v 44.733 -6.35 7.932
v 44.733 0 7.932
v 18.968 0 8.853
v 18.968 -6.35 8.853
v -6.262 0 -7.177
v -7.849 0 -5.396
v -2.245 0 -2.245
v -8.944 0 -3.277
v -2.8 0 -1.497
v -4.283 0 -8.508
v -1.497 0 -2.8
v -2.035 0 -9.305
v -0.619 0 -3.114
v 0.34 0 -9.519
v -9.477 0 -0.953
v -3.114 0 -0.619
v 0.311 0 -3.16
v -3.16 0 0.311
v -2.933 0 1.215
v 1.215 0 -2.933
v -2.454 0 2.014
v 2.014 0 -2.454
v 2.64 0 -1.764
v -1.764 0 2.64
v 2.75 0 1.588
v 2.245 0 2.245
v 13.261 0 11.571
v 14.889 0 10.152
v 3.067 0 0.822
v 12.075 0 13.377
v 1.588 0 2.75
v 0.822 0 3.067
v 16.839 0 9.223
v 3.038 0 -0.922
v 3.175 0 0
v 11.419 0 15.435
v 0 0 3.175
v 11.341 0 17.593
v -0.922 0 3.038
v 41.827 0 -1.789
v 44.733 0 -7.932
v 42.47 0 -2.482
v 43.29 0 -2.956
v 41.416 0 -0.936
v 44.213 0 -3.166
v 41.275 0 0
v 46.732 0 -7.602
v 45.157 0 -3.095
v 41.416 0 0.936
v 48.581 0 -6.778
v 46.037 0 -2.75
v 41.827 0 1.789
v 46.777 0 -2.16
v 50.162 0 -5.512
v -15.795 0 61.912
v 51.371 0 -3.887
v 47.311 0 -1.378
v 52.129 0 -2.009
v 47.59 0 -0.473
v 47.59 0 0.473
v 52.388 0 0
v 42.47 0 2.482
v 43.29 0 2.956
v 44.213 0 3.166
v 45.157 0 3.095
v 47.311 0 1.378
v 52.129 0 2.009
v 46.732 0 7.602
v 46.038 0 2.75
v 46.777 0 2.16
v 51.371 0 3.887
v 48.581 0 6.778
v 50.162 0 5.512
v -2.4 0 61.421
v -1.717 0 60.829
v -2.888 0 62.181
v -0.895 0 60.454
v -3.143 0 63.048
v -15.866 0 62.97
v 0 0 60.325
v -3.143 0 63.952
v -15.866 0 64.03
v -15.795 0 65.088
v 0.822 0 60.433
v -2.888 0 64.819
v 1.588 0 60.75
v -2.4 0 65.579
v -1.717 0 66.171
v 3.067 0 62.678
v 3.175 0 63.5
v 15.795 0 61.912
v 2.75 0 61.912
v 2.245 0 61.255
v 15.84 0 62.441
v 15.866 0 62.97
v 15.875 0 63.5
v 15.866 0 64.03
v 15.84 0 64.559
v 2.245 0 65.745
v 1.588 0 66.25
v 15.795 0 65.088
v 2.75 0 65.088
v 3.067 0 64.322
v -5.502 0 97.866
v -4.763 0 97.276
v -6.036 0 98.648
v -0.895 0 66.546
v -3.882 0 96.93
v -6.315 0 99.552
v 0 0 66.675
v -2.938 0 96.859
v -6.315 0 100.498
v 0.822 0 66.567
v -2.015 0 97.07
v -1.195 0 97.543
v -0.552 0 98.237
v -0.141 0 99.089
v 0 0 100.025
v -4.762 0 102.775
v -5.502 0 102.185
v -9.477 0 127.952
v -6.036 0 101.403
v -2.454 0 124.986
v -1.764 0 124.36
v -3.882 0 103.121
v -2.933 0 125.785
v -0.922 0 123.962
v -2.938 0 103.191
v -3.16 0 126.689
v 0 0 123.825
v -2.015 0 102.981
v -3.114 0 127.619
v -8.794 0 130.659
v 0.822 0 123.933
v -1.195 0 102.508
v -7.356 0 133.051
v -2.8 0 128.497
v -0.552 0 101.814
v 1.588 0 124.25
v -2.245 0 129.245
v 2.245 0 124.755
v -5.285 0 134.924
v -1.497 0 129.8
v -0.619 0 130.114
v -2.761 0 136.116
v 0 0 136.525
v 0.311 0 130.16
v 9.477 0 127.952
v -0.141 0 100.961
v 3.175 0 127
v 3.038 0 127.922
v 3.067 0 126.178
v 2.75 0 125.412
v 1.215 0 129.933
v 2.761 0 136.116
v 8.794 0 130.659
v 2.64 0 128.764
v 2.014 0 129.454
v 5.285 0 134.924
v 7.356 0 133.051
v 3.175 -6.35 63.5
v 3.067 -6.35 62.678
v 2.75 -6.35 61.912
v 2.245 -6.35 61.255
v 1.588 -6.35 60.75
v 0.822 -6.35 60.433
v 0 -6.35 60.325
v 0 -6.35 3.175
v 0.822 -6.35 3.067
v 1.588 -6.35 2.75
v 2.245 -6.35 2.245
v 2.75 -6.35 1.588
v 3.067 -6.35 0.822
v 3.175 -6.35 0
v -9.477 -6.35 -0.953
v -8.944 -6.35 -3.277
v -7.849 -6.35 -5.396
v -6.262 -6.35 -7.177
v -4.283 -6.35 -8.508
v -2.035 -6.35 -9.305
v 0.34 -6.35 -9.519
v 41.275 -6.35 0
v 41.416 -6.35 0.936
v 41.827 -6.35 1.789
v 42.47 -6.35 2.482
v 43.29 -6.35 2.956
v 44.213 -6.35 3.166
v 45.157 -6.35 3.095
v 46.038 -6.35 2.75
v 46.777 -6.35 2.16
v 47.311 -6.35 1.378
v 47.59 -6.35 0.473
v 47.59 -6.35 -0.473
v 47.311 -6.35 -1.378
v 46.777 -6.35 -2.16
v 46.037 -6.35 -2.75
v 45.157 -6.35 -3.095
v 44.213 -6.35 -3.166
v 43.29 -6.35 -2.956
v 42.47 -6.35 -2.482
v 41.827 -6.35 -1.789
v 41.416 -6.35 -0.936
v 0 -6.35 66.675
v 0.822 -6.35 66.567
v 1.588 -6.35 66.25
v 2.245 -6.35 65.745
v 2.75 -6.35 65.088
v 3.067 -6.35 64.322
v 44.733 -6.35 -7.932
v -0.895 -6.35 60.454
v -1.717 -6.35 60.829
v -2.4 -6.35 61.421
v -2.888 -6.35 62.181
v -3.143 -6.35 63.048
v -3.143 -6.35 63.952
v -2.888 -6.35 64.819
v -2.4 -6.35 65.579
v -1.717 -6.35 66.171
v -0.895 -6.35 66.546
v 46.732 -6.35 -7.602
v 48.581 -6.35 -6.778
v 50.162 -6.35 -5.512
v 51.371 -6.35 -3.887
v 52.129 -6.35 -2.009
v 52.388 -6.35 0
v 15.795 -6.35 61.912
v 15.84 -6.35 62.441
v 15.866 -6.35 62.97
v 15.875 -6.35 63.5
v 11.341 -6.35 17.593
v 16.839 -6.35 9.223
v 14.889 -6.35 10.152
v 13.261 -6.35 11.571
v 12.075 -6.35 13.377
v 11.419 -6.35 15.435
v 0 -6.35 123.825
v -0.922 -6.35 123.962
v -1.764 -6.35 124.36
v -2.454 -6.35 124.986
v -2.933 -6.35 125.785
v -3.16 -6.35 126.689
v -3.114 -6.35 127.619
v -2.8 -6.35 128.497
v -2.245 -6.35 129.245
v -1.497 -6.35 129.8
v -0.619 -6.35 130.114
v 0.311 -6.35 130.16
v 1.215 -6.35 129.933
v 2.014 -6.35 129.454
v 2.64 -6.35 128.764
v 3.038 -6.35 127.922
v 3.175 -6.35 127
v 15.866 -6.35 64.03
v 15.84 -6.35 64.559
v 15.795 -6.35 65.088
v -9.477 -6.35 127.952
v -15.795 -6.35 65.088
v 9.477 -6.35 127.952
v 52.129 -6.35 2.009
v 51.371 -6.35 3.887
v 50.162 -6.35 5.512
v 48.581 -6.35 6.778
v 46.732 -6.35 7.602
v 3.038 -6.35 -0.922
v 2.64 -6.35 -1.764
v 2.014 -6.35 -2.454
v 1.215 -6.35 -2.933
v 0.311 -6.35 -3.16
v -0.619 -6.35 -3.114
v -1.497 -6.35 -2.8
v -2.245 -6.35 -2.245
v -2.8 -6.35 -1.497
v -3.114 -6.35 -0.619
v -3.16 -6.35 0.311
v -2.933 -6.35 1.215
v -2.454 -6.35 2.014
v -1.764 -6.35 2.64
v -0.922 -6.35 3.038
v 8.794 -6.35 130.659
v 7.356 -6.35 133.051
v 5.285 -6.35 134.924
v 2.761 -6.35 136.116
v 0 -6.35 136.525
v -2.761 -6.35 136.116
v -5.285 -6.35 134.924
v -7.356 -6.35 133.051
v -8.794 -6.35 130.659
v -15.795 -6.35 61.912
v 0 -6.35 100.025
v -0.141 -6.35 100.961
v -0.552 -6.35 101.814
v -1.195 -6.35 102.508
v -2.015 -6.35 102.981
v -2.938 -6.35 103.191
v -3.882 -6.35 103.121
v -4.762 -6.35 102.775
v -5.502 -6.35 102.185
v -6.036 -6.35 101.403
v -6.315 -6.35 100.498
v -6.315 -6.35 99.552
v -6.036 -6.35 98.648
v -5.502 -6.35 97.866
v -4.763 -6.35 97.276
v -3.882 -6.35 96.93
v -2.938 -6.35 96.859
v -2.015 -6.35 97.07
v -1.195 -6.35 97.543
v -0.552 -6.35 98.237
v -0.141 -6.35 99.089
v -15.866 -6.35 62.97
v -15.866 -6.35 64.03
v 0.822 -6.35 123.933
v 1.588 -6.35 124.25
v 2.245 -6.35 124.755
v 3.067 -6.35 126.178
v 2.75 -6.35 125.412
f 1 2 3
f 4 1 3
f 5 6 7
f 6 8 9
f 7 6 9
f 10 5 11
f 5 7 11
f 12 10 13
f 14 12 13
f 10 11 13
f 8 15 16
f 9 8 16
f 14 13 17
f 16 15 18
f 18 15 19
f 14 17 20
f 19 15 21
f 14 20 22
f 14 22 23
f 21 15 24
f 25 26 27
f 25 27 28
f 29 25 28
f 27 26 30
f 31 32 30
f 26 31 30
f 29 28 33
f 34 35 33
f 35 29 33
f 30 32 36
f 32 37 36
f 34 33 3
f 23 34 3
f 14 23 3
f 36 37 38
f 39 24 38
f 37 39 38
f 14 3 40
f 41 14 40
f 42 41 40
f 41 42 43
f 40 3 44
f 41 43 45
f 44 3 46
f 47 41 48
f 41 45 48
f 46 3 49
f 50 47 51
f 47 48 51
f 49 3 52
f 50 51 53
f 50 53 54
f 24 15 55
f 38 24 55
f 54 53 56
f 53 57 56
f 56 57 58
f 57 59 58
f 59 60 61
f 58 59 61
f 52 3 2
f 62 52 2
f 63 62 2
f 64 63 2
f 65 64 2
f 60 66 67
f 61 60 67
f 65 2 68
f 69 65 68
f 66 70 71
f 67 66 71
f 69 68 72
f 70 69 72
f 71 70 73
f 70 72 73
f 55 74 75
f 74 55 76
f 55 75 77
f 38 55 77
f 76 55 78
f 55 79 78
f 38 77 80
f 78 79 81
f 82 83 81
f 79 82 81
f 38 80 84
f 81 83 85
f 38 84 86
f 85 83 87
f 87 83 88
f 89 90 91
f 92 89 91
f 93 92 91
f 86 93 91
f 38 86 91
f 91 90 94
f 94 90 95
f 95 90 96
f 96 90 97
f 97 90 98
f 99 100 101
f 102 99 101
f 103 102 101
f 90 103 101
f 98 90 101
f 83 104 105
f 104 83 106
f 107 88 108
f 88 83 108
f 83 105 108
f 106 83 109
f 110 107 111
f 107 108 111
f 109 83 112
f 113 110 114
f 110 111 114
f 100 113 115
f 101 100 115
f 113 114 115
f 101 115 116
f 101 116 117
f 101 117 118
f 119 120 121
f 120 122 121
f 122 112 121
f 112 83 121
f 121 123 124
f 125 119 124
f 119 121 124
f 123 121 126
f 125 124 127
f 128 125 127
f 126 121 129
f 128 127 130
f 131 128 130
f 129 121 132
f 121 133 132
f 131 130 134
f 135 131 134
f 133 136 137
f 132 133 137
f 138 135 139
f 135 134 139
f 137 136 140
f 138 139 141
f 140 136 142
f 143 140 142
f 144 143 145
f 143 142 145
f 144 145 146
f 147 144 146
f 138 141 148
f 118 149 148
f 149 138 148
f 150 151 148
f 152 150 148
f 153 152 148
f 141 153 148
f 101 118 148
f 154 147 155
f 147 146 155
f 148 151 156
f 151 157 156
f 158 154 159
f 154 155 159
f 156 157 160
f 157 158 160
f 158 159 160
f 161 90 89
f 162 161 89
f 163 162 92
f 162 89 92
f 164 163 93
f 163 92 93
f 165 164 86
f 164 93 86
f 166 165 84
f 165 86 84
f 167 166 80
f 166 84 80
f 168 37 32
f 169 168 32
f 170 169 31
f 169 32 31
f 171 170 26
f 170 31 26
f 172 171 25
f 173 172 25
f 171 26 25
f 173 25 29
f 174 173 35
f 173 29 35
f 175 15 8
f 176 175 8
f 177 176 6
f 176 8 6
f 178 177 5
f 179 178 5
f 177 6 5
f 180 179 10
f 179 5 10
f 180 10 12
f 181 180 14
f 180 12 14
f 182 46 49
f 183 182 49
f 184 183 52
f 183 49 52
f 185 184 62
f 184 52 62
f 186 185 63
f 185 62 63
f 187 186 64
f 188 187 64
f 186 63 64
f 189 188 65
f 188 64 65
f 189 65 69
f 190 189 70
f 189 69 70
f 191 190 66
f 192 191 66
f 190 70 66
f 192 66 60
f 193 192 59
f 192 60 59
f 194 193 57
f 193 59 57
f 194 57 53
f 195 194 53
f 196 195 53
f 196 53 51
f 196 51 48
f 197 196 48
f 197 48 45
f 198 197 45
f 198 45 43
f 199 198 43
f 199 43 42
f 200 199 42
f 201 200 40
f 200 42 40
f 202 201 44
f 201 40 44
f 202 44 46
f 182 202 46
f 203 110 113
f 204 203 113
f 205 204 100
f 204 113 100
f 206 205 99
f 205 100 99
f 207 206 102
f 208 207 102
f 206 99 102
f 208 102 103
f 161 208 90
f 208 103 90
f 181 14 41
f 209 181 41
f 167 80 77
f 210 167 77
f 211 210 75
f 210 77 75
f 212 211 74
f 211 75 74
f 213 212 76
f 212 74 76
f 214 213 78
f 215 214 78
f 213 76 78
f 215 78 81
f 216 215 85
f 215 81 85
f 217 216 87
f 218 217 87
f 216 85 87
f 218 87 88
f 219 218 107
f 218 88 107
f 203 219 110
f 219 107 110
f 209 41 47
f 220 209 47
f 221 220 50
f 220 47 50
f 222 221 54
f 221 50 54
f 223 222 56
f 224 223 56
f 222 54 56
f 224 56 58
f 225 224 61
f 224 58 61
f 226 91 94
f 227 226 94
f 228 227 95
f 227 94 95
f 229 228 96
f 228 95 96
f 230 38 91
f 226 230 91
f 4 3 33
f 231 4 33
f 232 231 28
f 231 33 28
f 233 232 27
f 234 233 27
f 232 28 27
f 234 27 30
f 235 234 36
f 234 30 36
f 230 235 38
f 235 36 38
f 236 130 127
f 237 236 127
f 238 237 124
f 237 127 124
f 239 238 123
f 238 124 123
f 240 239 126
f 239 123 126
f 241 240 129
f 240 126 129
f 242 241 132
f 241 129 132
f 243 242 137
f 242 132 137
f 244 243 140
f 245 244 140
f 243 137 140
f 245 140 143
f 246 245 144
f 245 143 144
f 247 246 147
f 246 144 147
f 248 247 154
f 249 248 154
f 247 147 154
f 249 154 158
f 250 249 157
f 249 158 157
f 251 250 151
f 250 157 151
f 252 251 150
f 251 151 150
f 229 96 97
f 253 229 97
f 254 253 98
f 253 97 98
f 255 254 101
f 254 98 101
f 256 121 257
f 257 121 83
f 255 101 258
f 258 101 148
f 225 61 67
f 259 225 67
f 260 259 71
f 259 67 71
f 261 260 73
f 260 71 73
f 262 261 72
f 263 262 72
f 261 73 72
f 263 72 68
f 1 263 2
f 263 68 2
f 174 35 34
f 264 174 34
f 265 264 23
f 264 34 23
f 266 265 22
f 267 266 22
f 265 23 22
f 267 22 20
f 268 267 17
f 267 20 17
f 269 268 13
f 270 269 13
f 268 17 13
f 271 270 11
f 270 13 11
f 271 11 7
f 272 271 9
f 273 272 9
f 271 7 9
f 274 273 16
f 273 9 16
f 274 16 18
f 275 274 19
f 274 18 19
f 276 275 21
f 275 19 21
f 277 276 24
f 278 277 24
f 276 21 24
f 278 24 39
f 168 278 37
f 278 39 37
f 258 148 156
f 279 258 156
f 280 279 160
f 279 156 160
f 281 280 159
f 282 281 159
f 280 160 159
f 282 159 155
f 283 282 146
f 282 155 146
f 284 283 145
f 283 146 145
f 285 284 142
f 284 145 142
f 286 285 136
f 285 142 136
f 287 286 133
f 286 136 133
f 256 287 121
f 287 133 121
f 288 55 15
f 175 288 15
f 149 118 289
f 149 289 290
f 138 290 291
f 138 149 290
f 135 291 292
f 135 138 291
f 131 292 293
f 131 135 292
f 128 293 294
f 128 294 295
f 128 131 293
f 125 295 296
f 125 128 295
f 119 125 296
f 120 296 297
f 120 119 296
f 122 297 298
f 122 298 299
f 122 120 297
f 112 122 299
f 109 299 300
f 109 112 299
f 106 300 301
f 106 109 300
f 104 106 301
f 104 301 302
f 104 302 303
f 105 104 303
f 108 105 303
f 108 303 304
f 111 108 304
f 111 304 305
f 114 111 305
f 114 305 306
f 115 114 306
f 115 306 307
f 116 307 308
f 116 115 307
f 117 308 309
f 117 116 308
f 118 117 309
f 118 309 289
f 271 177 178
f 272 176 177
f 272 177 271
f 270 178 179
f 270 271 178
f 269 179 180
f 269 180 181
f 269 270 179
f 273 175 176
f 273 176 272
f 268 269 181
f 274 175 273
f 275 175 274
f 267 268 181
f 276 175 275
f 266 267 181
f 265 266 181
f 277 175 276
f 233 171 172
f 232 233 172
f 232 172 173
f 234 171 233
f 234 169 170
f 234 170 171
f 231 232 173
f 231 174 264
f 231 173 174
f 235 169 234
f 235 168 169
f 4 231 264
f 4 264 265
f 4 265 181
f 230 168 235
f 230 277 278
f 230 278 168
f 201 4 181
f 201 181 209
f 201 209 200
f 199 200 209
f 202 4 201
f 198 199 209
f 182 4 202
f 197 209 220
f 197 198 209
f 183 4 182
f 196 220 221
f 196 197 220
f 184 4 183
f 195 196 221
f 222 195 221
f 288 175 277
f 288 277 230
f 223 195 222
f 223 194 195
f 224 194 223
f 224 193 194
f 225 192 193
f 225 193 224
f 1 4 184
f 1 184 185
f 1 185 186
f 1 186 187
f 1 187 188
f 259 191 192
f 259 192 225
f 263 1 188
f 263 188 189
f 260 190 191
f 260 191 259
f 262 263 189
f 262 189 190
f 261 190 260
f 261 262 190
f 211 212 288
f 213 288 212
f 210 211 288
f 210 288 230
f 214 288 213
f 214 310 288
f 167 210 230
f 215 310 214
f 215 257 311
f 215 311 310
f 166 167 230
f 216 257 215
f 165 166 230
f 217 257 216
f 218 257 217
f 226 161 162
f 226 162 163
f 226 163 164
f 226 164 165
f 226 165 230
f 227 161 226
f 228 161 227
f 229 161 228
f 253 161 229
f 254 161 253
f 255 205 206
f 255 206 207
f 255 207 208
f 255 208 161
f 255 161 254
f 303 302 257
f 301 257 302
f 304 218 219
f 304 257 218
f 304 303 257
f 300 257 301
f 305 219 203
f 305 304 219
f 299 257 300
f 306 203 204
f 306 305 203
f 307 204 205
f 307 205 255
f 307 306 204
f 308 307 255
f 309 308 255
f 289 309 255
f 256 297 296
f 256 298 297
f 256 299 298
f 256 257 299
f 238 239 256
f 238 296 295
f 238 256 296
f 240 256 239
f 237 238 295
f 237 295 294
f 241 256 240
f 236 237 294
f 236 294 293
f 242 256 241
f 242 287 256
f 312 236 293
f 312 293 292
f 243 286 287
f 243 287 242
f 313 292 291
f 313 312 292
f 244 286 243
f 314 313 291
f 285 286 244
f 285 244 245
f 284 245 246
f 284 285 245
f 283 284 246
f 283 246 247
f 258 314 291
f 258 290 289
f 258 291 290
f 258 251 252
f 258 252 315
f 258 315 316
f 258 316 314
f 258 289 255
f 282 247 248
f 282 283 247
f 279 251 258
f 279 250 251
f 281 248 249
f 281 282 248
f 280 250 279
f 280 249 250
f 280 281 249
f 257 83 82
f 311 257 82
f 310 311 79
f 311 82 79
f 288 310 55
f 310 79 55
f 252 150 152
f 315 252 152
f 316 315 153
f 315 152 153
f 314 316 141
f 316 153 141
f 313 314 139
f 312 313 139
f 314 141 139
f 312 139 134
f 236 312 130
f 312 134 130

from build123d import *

# Parameters (mm, degrees)
F0_R     = 3.175
F1_DEPTH = 6.35


with BuildPart() as f1:
    # F0 (on Front) → F1 (new body)
    with BuildSketch(Plane.XZ):
        with BuildLine():
            ThreePointArc((9.4772553384, 127.9525), (0, 136.525), (-9.4772553384, 127.9525))
            ThreePointArc((-9.4772553384, 127.9525), (-7.063929059, 120.6104357543), (0, 117.475))
            ThreePointArc((0, 117.475), (6.7351920908, 120.2648079092), (9.525, 127))
            ThreePointArc((9.525, 127), (9.5130563464, 127.4768479324), (9.4772553384, 127.9525))
        make_face()
        with BuildLine():
            ThreePointArc((3.175, 127), (2.2450640303, 124.7549359697), (0, 123.825))
            ThreePointArc((0, 123.825), (-2.2450640303, 129.2450640303), (3.175, 127))
        make_face(mode=Mode.SUBTRACT)
        with BuildLine():
            Line((-9.4772553384, 127.9525), (-15.7954255641, 65.0875))
            ThreePointArc((-15.7954255641, 65.0875), (-10.6492737428, 75.2732150983), (0, 79.375))
            Line((0, 79.375), (0, 100.0252))
            Line((0, 100.0252), (0, 117.475))
            ThreePointArc((0, 117.475), (-7.063929059, 120.6104357543), (-9.4772553384, 127.9525))
        make_face()
        with Locations((-3.175, 100.0252)):
            Circle(F0_R, mode=Mode.SUBTRACT)
        with BuildLine():
            Line((0, 100.0252), (0, 79.375))
            ThreePointArc((0, 79.375), (10.6492737428, 75.2732150983), (15.7954255641, 65.0875))
            Line((15.7954255641, 65.0875), (9.4772553384, 127.9525))
            ThreePointArc((9.4772553384, 127.9525), (9.5130563464, 127.4768479324), (9.525, 127))
            ThreePointArc((9.525, 127), (6.7351920908, 120.2648079092), (0, 117.475))
            Line((0, 117.475), (0, 100.0252))
        make_face()
        with BuildLine():
            ThreePointArc((-15.7954255641, 61.9125), (-10.6492737428, 51.7267849017), (0, 47.625))
            Line((0, 47.625), (0, 60.325))
            ThreePointArc((0, 60.325), (-3.175, 63.5), (0, 66.675))
            Line((0, 66.675), (0, 79.375))
            ThreePointArc((0, 79.375), (-10.6492737428, 75.2732150983), (-15.7954255641, 65.0875))
            ThreePointArc((-15.7954255641, 65.0875), (-15.875, 63.5), (-15.7954255641, 61.9125))
        make_face()
        with BuildLine():
            Line((0, 60.325), (0, 47.625))
            ThreePointArc((0, 47.625), (10.6492737428, 51.7267849017), (15.7954255641, 61.9125))
            ThreePointArc((15.7954255641, 61.9125), (15.8550939106, 62.7052534459), (15.875, 63.5))
            ThreePointArc((15.875, 63.5), (15.8550939106, 64.2947465541), (15.7954255641, 65.0875))
            ThreePointArc((15.7954255641, 65.0875), (10.6492737428, 75.2732150983), (0, 79.375))
            Line((0, 79.375), (0, 66.675))
            ThreePointArc((0, 66.675), (2.2450640303, 65.7450640303), (3.175, 63.5))
            ThreePointArc((3.175, 63.5), (2.2450640303, 61.2549359697), (0, 60.325))
        make_face()
        with BuildLine():
            ThreePointArc((-9.4772553384, -0.9525), (-7.063929059, 6.3895642457), (0, 9.525))
            Line((0, 9.525), (0, 47.625))
            ThreePointArc((0, 47.625), (-10.6492737428, 51.7267849017), (-15.7954255641, 61.9125))
            Line((-15.7954255641, 61.9125), (-9.4772553384, -0.9525))
        make_face()
        with BuildLine():
            Line((0, 47.625), (0, 9.525))
            ThreePointArc((0, 9.525), (6.7351920908, 6.7351920908), (9.525, 0))
            Line((9.525, 0), (36.5125, 0))
            ThreePointArc((36.5125, 0), (38.9384772185, 5.7120069047), (44.7334821429, 7.9324362036))
            Line((44.7334821429, 7.9324362036), (18.9676000005, 8.8532337108))
            ThreePointArc((18.9676000005, 8.8532337108), (13.2611998974, 11.5713591498), (11.3411865923, 17.5933818124))
            Line((11.3411865923, 17.5933818124), (15.7954255641, 61.9125))
            ThreePointArc((15.7954255641, 61.9125), (10.6492737428, 51.7267849017), (0, 47.625))
        make_face()
        with BuildLine():
            ThreePointArc((3.175, 0), (-2.2450640303, -2.2450640303), (0, 3.175))
            Line((0, 3.175), (0, 9.525))
            ThreePointArc((0, 9.525), (-7.063929059, 6.3895642457), (-9.4772553384, -0.9525))
            ThreePointArc((-9.4772553384, -0.9525), (-6.2623833816, -7.1769199091), (0.3401785714, -9.5189234444))
            ThreePointArc((0.3401785714, -9.5189234444), (6.8544082857, -6.6138273378), (9.525, 0))
            Line((9.525, 0), (3.175, 0))
        make_face()
        with BuildLine():
            Line((0, 9.525), (0, 3.175))
            ThreePointArc((0, 3.175), (2.2450640303, 2.2450640303), (3.175, 0))
            Line((3.175, 0), (9.525, 0))
            ThreePointArc((9.525, 0), (6.7351920908, 6.7351920908), (0, 9.525))
        make_face()
        with BuildLine():
            Line((36.5125, 0), (9.525, 0))
            ThreePointArc((9.525, 0), (6.8544082857, -6.6138273378), (0.3401785714, -9.5189234444))
            Line((0.3401785714, -9.5189234444), (44.7334821429, -7.9324362036))
            ThreePointArc((44.7334821429, -7.9324362036), (38.9384772185, -5.7120069047), (36.5125, 0))
        make_face()
        with BuildLine():
            ThreePointArc((44.7334821429, 7.9324362036), (38.9384772185, 5.7120069047), (36.5125, 0))
            ThreePointArc((36.5125, 0), (38.9384772185, -5.7120069047), (44.7334821429, -7.9324362036))
            ThreePointArc((44.7334821429, -7.9324362036), (50.1620069047, -5.5115227815), (52.3875, 0))
            ThreePointArc((52.3875, 0), (50.1620069047, 5.5115227815), (44.7334821429, 7.9324362036))
        make_face()
        with BuildLine():
            ThreePointArc((47.625, 0), (44.45, -3.175), (41.275, 0))
            ThreePointArc((41.275, 0), (44.45, 3.175), (47.625, 0))
        make_face(mode=Mode.SUBTRACT)
    extrude(amount=F1_DEPTH)


solid = f1.part
